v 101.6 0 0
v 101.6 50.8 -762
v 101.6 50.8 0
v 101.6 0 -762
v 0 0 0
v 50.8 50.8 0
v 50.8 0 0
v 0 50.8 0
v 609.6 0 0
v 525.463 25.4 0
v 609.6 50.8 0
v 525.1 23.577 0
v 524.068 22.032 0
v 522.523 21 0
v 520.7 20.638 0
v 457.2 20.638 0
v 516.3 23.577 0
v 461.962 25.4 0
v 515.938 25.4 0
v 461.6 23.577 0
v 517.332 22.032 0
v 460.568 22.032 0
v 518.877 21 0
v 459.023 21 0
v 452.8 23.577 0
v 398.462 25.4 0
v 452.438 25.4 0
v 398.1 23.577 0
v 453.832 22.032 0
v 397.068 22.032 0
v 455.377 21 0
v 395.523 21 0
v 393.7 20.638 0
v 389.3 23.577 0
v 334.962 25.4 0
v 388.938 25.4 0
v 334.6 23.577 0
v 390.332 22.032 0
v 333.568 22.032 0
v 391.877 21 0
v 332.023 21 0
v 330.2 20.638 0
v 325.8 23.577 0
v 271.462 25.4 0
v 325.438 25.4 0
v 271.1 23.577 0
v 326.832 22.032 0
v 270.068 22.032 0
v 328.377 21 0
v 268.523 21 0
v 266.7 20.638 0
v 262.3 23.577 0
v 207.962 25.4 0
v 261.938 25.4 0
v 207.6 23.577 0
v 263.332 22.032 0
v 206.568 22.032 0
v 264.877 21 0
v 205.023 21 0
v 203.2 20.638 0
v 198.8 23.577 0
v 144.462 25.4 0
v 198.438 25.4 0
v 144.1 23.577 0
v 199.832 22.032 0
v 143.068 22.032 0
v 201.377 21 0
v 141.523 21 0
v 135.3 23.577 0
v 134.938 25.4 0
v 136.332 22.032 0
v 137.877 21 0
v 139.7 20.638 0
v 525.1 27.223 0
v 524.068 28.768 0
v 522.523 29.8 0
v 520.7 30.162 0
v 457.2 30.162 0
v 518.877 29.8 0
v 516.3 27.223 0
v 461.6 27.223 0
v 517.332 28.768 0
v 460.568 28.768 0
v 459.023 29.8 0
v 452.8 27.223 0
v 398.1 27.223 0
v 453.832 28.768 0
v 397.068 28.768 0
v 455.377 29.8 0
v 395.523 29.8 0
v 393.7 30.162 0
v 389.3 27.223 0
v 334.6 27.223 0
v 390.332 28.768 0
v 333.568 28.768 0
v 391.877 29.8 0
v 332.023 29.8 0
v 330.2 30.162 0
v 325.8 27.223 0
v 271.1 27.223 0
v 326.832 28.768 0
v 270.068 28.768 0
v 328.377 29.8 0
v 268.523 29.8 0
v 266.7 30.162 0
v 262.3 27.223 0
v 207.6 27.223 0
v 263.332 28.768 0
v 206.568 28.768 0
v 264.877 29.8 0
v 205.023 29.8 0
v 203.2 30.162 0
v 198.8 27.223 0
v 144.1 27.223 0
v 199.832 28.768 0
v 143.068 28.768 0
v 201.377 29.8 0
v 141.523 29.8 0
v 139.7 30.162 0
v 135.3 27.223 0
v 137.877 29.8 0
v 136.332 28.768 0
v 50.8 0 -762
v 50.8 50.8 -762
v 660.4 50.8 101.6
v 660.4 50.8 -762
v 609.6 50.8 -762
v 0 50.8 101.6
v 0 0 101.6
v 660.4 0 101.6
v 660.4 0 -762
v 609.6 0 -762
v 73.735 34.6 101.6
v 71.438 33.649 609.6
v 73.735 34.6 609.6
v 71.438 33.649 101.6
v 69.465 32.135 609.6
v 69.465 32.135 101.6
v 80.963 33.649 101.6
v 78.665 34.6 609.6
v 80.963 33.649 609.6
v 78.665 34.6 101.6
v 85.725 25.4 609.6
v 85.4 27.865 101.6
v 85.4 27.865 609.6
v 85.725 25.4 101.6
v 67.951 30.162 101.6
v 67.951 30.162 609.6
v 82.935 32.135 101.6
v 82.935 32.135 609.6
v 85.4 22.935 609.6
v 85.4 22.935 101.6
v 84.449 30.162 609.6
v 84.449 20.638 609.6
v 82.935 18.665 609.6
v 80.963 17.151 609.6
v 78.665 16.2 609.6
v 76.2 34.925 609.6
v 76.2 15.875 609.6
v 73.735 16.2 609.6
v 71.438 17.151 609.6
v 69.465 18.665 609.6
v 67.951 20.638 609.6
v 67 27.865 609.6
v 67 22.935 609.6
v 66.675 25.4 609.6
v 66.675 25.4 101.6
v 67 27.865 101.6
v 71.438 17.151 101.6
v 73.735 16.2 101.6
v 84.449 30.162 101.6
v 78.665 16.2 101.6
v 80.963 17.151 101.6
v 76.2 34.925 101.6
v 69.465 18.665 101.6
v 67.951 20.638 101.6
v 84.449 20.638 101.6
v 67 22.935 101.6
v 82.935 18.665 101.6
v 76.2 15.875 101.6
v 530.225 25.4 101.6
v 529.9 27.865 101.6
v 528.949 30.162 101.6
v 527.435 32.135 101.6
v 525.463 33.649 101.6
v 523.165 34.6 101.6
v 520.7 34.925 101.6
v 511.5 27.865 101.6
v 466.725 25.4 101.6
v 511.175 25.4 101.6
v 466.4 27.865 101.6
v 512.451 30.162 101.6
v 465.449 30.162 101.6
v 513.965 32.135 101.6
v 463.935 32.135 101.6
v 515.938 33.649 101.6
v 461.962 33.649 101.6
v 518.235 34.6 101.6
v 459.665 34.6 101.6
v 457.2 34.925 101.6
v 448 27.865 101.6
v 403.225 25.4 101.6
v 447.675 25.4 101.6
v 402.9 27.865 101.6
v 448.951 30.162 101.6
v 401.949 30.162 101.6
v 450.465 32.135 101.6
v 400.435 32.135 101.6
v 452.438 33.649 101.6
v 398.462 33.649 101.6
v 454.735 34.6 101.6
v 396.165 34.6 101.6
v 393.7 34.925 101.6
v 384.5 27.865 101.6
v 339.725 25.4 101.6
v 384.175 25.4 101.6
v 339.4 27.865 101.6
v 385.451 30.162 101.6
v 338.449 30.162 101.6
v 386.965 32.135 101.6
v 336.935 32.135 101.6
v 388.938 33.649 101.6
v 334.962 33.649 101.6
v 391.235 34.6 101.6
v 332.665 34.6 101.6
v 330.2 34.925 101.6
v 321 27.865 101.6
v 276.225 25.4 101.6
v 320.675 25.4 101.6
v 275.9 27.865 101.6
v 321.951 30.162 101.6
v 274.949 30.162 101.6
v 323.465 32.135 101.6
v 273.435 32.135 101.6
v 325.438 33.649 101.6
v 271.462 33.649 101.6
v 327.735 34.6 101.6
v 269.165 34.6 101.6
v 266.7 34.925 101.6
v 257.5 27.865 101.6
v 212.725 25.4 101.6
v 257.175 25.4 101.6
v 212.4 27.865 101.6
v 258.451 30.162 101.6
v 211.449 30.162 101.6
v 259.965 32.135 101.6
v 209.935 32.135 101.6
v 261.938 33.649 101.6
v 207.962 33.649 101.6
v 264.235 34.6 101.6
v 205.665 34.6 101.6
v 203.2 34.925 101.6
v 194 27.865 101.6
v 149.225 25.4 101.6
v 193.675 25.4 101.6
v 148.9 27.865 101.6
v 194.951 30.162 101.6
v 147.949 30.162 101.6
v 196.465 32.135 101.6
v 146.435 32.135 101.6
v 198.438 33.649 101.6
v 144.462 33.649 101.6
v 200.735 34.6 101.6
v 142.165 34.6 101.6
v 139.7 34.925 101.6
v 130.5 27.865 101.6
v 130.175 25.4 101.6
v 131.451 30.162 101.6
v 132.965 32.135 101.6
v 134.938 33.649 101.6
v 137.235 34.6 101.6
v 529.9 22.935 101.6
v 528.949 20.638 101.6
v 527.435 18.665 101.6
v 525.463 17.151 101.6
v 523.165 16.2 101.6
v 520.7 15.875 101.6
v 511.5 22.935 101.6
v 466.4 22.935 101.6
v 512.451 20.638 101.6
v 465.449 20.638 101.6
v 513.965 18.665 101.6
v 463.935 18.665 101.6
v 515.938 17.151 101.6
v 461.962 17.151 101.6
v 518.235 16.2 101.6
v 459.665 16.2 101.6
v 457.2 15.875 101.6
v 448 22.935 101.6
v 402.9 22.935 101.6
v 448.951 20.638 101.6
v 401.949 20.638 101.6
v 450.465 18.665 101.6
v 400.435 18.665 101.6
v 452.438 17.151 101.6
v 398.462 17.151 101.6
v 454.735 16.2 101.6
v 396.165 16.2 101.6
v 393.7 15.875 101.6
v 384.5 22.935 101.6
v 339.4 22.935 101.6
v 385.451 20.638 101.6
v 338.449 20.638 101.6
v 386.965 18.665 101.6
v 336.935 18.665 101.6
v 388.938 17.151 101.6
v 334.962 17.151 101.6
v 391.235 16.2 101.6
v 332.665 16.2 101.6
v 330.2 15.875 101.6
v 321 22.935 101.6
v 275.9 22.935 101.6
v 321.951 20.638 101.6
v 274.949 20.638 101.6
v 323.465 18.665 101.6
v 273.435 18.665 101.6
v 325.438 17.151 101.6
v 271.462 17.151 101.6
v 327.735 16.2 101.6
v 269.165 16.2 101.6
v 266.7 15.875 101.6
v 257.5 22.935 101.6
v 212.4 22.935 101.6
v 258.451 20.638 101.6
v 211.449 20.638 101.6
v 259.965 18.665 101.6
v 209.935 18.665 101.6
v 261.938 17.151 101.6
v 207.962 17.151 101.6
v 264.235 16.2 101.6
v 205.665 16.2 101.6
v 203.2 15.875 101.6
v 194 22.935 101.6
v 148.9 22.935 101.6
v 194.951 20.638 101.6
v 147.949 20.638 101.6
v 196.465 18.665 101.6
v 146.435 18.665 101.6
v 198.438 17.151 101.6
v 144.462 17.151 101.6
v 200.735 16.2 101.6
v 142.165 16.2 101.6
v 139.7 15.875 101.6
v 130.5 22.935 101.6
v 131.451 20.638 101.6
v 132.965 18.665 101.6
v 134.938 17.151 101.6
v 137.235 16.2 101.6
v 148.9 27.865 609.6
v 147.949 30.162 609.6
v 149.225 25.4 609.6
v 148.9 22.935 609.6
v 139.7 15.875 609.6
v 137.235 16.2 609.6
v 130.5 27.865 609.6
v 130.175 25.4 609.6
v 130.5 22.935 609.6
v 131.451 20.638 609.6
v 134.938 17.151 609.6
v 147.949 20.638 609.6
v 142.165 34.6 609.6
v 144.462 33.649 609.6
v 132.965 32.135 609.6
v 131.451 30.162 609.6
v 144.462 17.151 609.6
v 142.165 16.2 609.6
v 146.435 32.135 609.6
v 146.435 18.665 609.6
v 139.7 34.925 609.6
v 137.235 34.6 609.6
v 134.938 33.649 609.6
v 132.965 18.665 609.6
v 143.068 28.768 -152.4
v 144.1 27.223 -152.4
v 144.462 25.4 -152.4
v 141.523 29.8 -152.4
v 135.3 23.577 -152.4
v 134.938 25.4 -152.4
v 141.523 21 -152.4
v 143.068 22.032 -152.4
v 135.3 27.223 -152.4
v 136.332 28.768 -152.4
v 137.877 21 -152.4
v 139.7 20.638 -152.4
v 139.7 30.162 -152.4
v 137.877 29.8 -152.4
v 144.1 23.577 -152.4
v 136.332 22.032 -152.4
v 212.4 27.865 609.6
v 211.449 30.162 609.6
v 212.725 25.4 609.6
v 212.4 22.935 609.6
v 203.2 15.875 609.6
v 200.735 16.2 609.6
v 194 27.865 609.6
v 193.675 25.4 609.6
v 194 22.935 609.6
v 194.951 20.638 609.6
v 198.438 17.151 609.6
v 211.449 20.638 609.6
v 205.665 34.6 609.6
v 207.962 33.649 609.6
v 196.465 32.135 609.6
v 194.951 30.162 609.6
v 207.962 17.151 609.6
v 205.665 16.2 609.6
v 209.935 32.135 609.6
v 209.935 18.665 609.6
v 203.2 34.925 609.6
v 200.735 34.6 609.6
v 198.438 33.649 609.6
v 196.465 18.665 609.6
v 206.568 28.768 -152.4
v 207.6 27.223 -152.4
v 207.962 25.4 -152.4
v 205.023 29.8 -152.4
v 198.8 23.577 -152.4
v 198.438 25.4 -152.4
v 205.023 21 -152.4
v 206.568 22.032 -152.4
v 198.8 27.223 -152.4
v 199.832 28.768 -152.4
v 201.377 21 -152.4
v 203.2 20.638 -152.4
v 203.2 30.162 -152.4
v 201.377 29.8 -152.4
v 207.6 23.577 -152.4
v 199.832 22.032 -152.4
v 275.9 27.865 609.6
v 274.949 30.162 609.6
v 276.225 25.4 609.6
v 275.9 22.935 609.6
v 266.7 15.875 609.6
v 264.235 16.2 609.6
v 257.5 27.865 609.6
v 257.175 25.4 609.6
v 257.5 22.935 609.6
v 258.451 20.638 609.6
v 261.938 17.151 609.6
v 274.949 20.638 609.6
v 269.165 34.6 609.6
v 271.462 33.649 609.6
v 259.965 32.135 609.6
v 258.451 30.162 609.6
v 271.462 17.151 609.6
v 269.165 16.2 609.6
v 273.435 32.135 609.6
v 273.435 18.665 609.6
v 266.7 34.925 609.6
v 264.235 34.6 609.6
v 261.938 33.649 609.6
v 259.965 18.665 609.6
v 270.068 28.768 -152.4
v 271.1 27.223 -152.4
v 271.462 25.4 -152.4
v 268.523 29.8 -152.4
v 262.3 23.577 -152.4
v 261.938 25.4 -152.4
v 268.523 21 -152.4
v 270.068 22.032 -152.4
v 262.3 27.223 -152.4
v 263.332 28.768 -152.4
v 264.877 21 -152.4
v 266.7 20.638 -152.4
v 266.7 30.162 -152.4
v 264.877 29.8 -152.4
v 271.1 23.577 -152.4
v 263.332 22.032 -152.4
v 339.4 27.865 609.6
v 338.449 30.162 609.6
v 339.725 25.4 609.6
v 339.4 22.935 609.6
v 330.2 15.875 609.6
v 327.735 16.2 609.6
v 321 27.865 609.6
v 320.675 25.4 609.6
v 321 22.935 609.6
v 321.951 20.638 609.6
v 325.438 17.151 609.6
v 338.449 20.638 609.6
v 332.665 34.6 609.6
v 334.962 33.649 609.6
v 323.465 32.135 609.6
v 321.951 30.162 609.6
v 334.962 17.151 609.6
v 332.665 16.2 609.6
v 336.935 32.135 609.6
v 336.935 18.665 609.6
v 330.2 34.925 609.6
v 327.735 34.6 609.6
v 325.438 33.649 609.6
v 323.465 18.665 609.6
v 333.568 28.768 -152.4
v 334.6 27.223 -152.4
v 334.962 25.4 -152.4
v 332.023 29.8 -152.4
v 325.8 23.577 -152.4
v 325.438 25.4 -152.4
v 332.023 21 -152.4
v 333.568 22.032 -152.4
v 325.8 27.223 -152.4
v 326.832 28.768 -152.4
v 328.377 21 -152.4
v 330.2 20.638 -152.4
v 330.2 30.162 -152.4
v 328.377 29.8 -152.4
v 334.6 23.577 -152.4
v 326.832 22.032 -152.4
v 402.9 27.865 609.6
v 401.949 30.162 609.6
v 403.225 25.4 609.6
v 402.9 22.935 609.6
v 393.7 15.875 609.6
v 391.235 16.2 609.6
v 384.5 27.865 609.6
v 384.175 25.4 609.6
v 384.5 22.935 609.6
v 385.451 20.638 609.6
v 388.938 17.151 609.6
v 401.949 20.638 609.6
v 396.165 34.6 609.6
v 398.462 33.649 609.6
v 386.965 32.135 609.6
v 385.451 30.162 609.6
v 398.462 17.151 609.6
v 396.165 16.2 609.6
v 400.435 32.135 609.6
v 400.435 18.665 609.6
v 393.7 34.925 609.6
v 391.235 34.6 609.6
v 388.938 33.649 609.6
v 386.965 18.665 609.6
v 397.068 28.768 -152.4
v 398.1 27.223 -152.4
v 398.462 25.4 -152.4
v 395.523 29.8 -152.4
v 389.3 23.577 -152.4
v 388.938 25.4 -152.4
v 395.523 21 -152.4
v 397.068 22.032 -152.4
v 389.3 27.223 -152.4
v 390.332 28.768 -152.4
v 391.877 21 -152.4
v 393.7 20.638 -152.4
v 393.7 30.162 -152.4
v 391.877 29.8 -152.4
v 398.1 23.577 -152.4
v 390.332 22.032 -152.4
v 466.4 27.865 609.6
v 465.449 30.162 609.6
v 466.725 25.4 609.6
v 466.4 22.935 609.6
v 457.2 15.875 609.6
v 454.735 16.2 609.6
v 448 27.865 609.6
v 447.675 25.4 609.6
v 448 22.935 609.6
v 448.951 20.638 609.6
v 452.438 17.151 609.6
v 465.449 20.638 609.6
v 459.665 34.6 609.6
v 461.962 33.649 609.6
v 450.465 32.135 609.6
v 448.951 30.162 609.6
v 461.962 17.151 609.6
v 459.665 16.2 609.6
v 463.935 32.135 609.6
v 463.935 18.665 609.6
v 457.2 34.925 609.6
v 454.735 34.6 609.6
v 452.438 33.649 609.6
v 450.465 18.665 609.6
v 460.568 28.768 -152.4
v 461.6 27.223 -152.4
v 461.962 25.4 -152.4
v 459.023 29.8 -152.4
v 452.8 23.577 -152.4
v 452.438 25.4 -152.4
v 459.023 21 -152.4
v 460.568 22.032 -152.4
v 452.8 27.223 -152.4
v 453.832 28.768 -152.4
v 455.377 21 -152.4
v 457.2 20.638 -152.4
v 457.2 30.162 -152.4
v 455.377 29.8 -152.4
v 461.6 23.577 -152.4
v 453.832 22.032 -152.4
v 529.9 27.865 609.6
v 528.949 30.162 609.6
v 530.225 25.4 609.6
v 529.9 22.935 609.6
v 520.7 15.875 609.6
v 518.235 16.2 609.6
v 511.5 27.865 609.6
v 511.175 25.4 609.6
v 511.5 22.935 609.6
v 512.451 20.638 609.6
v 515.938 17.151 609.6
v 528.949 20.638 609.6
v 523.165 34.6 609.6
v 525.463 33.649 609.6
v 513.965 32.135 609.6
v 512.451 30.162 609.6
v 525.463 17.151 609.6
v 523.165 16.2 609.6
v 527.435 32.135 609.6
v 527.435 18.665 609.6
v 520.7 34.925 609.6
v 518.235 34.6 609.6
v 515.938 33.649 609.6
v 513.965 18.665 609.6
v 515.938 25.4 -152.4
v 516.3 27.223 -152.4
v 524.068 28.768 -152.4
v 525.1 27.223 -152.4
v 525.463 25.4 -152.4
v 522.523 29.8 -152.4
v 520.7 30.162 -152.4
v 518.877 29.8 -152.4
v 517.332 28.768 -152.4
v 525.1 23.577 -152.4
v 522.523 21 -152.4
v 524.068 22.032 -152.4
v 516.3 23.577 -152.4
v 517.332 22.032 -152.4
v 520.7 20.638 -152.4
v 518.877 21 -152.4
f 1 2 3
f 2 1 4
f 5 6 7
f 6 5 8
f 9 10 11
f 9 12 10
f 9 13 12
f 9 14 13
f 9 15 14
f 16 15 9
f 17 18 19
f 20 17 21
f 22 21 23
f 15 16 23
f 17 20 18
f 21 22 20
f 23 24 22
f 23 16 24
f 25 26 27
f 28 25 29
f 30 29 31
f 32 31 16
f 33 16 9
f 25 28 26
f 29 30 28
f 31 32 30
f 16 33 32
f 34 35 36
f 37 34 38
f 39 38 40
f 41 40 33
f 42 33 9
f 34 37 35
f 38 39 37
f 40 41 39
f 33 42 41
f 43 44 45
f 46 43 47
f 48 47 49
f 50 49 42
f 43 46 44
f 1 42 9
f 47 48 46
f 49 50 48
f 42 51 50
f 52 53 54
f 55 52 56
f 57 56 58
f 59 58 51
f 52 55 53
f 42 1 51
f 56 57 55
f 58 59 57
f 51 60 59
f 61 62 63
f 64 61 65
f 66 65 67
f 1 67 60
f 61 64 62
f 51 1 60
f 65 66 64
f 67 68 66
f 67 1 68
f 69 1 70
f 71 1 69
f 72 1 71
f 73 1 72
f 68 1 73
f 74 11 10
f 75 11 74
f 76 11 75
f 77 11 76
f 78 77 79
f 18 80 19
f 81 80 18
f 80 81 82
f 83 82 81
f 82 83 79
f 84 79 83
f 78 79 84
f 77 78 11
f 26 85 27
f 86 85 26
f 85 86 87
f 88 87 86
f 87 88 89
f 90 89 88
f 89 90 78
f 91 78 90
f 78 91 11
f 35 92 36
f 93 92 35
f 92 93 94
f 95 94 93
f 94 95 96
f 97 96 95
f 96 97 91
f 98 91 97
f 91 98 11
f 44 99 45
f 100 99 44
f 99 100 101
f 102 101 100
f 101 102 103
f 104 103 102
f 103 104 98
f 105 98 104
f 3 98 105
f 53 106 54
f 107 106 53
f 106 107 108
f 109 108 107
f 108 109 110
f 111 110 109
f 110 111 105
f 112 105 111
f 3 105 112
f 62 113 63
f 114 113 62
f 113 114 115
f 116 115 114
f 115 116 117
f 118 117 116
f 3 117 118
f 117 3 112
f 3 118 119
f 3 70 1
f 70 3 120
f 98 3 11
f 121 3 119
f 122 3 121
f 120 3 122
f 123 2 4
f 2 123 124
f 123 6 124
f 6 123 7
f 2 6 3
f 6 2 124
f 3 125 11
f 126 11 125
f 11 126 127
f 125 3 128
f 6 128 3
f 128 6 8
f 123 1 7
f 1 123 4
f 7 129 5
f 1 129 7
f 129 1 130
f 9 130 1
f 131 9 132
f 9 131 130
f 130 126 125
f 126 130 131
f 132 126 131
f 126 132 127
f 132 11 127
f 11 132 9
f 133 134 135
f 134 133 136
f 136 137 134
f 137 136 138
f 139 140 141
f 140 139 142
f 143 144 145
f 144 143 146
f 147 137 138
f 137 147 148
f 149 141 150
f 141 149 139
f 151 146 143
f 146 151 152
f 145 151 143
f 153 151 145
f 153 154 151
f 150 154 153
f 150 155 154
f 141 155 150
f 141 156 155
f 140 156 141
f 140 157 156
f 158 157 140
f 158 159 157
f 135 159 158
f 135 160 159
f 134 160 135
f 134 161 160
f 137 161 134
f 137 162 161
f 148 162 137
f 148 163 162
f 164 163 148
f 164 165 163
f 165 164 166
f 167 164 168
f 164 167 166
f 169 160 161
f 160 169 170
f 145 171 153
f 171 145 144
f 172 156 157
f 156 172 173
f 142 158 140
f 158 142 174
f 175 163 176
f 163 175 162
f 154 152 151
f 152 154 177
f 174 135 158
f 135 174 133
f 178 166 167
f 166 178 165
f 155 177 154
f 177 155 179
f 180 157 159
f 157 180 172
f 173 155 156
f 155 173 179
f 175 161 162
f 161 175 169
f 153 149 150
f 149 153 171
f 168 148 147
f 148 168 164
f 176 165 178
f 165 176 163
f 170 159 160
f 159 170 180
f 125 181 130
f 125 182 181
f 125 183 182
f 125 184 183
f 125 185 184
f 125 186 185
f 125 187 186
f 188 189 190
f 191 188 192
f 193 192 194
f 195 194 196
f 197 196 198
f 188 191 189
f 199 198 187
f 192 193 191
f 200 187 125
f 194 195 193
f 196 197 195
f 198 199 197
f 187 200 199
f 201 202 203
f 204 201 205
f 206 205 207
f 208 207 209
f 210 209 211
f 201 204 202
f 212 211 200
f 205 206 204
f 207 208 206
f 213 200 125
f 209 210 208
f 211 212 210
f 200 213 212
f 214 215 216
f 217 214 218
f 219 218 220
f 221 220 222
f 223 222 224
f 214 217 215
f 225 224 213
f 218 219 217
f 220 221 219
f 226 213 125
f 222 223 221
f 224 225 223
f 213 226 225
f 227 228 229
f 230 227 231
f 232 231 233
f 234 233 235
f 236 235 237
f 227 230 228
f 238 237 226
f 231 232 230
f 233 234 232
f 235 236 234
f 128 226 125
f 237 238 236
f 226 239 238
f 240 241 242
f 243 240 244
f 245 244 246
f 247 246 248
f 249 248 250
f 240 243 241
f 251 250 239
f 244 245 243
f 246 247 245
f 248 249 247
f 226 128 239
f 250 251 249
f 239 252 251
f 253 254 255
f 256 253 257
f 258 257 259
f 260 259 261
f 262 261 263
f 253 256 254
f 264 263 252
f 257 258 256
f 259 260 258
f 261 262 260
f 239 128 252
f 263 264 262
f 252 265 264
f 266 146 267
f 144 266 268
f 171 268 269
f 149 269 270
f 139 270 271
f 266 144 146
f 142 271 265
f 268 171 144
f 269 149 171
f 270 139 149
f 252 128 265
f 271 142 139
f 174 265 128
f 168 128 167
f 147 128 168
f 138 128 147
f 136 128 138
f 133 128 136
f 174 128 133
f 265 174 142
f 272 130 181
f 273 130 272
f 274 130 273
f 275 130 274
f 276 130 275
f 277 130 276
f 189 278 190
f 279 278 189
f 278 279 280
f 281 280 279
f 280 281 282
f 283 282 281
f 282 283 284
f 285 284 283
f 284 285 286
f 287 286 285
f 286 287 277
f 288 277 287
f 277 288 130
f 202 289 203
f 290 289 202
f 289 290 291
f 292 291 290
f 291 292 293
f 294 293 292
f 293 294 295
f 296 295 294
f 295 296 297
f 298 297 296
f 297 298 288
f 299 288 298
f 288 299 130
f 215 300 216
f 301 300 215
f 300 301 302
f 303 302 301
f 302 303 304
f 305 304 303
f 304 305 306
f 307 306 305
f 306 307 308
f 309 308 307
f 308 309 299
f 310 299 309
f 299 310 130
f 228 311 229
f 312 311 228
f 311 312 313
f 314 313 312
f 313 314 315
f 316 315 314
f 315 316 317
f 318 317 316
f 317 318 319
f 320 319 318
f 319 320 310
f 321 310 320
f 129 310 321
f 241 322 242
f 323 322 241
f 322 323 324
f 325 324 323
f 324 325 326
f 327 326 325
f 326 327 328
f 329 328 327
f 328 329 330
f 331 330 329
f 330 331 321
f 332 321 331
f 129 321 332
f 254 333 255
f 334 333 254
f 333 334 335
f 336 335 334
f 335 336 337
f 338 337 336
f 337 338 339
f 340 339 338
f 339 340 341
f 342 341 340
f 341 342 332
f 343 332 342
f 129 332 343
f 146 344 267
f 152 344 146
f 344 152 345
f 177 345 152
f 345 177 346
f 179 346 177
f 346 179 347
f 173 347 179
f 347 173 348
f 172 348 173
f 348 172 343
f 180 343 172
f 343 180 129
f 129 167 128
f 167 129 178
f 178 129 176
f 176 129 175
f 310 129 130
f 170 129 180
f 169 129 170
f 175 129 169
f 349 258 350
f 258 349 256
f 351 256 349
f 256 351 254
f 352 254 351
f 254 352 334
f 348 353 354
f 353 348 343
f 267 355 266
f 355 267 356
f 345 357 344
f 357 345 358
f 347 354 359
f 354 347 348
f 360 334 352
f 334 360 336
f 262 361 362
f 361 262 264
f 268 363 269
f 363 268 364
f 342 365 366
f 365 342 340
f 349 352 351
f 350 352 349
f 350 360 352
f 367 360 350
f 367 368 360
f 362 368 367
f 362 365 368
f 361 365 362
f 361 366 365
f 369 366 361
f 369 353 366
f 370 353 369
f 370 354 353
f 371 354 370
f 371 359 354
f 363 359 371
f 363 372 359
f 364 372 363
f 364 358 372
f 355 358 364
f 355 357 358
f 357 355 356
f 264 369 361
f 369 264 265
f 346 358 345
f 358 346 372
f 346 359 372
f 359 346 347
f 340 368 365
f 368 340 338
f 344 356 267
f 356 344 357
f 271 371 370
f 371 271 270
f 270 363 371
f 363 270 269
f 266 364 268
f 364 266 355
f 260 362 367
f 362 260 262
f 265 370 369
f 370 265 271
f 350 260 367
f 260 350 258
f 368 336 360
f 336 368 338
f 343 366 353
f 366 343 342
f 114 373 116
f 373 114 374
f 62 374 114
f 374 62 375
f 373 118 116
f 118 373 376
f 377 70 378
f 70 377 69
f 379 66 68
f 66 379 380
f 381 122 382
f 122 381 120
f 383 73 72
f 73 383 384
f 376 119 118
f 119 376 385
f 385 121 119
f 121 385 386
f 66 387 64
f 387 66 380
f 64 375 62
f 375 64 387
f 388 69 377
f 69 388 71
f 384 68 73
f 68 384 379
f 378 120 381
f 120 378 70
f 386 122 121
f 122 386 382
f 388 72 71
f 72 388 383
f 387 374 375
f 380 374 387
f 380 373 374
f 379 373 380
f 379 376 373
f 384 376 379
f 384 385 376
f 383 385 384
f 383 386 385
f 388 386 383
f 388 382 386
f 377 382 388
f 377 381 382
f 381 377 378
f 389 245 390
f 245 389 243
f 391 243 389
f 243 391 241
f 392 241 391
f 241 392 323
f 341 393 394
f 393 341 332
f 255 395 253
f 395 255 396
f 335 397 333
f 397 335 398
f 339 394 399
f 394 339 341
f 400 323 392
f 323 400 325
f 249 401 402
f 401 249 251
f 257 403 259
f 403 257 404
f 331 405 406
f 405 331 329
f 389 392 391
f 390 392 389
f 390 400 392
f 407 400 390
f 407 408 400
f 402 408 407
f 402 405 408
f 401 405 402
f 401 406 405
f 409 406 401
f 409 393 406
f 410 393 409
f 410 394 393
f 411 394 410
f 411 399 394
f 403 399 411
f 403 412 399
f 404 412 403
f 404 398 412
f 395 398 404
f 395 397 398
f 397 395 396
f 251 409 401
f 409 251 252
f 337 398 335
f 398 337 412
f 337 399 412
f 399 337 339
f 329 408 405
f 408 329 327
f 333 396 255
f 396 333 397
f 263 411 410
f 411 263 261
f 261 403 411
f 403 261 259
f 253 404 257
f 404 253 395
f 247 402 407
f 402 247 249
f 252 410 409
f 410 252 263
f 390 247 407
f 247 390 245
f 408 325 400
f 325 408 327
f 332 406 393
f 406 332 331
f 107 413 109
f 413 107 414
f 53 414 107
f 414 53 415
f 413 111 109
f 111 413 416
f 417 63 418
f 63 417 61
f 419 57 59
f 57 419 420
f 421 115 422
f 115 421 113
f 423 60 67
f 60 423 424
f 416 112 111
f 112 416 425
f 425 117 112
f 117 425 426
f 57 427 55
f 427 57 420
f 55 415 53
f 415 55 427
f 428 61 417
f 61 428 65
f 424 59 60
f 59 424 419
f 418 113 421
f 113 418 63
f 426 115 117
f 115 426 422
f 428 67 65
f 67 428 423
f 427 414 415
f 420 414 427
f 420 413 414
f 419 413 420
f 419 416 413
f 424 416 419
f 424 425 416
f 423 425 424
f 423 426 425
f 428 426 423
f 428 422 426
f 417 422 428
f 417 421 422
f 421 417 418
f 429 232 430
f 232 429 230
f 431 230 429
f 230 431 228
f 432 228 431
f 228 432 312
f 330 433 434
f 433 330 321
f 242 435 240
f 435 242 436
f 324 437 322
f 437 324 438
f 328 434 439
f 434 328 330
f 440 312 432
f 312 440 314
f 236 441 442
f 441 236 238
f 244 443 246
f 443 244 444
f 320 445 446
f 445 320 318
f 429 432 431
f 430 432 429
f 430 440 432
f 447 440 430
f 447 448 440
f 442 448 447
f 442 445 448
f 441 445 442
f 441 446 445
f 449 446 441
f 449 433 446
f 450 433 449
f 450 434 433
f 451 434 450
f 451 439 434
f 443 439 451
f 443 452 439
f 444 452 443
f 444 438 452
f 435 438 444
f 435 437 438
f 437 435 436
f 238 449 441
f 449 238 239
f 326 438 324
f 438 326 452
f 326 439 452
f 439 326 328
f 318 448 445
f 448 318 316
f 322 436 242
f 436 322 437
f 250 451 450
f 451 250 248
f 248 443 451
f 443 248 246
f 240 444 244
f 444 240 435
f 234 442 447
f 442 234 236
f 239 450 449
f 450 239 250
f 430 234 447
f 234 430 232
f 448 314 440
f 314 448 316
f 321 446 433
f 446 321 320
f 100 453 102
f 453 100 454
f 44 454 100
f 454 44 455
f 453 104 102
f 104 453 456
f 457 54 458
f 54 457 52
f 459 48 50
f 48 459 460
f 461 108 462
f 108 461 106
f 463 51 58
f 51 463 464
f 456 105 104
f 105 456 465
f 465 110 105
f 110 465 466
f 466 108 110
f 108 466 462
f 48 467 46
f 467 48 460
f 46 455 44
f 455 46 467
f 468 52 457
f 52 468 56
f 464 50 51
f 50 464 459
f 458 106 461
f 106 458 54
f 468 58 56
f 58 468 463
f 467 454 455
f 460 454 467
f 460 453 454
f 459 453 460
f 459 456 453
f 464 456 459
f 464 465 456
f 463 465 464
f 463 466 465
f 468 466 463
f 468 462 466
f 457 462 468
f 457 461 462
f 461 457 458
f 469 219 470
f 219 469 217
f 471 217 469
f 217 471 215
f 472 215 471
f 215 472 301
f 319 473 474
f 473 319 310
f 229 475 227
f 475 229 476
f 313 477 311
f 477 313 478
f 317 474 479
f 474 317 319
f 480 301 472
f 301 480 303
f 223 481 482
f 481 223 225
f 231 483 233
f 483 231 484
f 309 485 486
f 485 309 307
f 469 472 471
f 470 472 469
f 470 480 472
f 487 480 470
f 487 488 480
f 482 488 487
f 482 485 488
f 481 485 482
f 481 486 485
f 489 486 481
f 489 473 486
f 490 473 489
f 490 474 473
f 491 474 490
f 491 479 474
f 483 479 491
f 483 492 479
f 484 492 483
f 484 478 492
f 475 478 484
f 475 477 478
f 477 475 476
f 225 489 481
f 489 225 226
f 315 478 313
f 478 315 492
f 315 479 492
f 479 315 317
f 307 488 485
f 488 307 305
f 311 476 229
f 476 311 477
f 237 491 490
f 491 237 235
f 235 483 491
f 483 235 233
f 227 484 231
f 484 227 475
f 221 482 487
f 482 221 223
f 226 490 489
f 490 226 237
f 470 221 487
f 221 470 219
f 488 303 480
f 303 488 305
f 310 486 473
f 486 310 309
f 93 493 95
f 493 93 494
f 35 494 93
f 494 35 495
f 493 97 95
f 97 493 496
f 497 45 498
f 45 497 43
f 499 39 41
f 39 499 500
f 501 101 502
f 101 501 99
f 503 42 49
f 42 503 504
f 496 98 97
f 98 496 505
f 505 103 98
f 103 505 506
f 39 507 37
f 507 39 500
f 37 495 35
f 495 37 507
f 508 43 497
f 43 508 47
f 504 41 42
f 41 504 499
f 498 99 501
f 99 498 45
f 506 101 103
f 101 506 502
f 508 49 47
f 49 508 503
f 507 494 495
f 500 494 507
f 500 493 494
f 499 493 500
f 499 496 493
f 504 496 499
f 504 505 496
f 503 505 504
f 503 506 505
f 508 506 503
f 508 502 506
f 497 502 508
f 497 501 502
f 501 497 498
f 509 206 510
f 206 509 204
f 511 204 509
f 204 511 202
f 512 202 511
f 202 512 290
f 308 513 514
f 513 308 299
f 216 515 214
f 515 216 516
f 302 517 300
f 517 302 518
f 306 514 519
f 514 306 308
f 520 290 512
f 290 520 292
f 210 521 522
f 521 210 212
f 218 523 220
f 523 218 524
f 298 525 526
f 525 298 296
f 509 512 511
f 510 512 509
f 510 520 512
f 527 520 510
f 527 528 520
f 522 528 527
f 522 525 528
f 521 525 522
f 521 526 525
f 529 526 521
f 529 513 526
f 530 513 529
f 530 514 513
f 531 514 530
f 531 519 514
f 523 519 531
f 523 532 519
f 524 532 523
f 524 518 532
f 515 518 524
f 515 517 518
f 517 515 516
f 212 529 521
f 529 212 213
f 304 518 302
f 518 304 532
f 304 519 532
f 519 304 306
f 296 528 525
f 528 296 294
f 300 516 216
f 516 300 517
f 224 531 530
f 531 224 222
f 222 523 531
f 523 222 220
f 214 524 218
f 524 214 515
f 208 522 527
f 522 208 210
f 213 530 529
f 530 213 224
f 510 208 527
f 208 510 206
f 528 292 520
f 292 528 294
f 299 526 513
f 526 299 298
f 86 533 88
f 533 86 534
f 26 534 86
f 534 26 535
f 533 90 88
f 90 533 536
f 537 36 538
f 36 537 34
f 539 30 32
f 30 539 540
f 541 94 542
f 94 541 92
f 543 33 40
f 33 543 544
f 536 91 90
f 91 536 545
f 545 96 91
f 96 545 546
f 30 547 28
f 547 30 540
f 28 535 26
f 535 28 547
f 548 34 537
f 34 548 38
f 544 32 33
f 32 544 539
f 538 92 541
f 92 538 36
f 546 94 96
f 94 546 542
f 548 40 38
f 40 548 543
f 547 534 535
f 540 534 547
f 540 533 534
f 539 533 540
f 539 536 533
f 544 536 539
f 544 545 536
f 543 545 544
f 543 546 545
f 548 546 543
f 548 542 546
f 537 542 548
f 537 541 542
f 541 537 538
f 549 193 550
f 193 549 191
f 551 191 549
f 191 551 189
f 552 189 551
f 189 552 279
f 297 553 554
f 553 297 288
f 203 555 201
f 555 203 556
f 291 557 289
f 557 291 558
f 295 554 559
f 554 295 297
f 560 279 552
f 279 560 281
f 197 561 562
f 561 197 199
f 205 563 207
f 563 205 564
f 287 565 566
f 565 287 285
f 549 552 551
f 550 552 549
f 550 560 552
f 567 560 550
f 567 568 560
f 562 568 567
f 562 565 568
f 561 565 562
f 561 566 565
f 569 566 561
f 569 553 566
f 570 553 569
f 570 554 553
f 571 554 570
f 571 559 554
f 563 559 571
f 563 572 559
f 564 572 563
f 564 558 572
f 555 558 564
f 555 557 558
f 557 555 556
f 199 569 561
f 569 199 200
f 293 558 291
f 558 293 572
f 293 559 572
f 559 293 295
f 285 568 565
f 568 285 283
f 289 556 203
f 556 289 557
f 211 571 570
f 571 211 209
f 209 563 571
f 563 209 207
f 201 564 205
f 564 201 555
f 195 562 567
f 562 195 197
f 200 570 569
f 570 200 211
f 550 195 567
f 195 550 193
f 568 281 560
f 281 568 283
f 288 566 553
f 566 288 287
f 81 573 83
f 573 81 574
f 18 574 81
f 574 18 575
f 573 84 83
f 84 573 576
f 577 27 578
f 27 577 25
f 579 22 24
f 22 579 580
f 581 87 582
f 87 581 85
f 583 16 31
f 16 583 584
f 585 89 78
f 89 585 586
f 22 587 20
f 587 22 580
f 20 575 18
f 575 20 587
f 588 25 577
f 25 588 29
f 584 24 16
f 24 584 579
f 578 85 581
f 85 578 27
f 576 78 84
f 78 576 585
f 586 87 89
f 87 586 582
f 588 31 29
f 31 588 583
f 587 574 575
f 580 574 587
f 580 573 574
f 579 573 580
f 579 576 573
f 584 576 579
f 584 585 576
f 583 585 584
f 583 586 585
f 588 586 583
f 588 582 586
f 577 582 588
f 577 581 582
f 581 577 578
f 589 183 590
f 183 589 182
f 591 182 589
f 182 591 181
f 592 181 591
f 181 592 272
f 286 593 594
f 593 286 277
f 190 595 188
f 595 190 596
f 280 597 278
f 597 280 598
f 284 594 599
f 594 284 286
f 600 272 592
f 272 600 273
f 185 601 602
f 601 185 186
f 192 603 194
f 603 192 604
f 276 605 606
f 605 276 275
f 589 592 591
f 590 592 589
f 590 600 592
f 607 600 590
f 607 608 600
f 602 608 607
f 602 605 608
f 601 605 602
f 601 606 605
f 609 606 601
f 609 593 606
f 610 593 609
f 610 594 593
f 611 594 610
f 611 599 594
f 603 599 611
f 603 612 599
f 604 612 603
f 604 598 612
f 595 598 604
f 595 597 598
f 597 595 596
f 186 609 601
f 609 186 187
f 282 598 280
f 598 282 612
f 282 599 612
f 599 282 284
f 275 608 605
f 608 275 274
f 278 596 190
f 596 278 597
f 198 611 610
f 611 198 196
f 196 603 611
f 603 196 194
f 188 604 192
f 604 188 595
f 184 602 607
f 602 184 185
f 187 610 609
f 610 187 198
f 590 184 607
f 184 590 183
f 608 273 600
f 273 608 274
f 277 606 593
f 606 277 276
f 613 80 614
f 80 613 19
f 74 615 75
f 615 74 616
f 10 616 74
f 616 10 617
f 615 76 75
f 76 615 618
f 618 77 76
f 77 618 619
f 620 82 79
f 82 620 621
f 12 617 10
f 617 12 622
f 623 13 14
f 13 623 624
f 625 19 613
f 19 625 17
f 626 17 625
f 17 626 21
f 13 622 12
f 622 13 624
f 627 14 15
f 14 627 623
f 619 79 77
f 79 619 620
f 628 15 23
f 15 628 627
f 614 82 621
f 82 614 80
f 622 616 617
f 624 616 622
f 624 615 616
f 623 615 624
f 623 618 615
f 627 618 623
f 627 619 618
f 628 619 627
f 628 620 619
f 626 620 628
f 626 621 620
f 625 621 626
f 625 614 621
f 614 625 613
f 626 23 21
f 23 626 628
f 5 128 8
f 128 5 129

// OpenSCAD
// Cristal Baschet — frame / rod-array ENVELOPE ONLY
// SPDX-License-Identifier: CC-BY-4.0
//
// Source of truth: no design table (xlsx) or measured reference exists for
// this instrument yet (see ../design.md, ../decision-record.md). Every
// dimension below is an `assumption` bounding-envelope placeholder for
// bench-rig layout planning, NOT a released rod, stem, or resonator spec.
//
// Authority: pending_measurement. NOT fabrication authority until reviewed
// against a measured reference or design table (see
// ../visual-output-register.csv, ../cad/mcp-session-log.md).
//
// EXPLICITLY OUT OF SCOPE (per design.md subsystem gates — hand-refined,
// tuning-sensitive regions this envelope does not model):
//   - glass rod diameter/length/finish and wet-finger friction tuning
//   - threaded stem thread family, length, and boundary conditions
//   - movable-mass position / tuning-table values
//   - cone/flap/whisker resonator geometry and acoustic response
// This file models only the bounding frame and rod-array LAYOUT (count and
// spacing as bench-planning placeholders) so a builder can block out shop
// space and a swappable-module frame before any of the above is measured.

// ---- Parameters (all `assumption`, bounding-envelope only) ----
rod_count           = 8;      // assumption: bench-rig planning count, design.md BOM-001 (not released)
rod_spacing_in       = 2.5;   // assumption: clearance for wet-finger play access, design.md player_interface subsystem
rod_envelope_len_in  = 20;    // assumption: bounding length only, NOT a released rod length (design.md CL-001: pending_measurement)
rod_envelope_dia_in  = 0.75;  // assumption: bounding diameter only, NOT a released rod diameter (design.md CL-001: pending_measurement)
stem_envelope_len_in = 10;    // assumption: bounding length only, NOT a released stem length (design.md CL-003: pending_measurement)
stem_envelope_dia_in = 0.375; // assumption: bounding diameter only, NOT a released stem diameter (design.md CL-003: pending_measurement)
frame_rail_len_in    = rod_count * rod_spacing_in + 6;  // formula: rod array footprint + margin, not a fixed value
frame_rail_h_in      = 4;     // assumption: rail cross-section height, design.md CL-009 (pending_measurement)
frame_rail_w_in      = 2;     // assumption: rail cross-section width, design.md CL-009 (pending_measurement)
frame_leg_h_in       = 30;    // assumption: player standing/seated access height, design.md player_interface subsystem

in = 25.4; // mm per inch

// ---- Modules ----

// One rod-array bounding envelope (cylinder placeholder — NOT a rod spec)
module rod_envelope() {
    cylinder(h = rod_envelope_len_in * in, d = rod_envelope_dia_in * in, center = false, $fn = 24);
}

// One stem-array bounding envelope (cylinder placeholder — NOT a stem spec)
module stem_envelope() {
    cylinder(h = stem_envelope_len_in * in, d = stem_envelope_dia_in * in, center = false, $fn = 16);
}

// Frame rail bounding box (base rail the rod/stem modules mount to)
module frame_rail() {
    cube([frame_rail_len_in * in, frame_rail_w_in * in, frame_rail_h_in * in], center = false);
}

// Frame legs (simple bounding-box supports, count derived from rail length)
module frame_legs() {
    leg_w_in = frame_rail_w_in;
    for (x = [leg_w_in, frame_rail_len_in - leg_w_in])
        translate([x * in, 0, -frame_leg_h_in * in])
            cube([leg_w_in * in, frame_rail_w_in * in, frame_leg_h_in * in], center = false);
}

// Rod + stem array laid out across the rail (bench-rig planning layout only)
module rod_stem_array() {
    for (i = [0 : rod_count - 1]) {
        x = (3 + i * rod_spacing_in) * in;
        translate([x, frame_rail_w_in * in / 2, frame_rail_h_in * in])
            rod_envelope();
        translate([x, frame_rail_w_in * in / 2, frame_rail_h_in * in - stem_envelope_len_in * in])
            stem_envelope();
    }
}

// ---- Top-level assembly ----
module cristal_baschet_envelope() {
    color("SlateGray") frame_rail();
    color("DimGray") frame_legs();
    color("LightSkyBlue") rod_stem_array();
}

cristal_baschet_envelope();
